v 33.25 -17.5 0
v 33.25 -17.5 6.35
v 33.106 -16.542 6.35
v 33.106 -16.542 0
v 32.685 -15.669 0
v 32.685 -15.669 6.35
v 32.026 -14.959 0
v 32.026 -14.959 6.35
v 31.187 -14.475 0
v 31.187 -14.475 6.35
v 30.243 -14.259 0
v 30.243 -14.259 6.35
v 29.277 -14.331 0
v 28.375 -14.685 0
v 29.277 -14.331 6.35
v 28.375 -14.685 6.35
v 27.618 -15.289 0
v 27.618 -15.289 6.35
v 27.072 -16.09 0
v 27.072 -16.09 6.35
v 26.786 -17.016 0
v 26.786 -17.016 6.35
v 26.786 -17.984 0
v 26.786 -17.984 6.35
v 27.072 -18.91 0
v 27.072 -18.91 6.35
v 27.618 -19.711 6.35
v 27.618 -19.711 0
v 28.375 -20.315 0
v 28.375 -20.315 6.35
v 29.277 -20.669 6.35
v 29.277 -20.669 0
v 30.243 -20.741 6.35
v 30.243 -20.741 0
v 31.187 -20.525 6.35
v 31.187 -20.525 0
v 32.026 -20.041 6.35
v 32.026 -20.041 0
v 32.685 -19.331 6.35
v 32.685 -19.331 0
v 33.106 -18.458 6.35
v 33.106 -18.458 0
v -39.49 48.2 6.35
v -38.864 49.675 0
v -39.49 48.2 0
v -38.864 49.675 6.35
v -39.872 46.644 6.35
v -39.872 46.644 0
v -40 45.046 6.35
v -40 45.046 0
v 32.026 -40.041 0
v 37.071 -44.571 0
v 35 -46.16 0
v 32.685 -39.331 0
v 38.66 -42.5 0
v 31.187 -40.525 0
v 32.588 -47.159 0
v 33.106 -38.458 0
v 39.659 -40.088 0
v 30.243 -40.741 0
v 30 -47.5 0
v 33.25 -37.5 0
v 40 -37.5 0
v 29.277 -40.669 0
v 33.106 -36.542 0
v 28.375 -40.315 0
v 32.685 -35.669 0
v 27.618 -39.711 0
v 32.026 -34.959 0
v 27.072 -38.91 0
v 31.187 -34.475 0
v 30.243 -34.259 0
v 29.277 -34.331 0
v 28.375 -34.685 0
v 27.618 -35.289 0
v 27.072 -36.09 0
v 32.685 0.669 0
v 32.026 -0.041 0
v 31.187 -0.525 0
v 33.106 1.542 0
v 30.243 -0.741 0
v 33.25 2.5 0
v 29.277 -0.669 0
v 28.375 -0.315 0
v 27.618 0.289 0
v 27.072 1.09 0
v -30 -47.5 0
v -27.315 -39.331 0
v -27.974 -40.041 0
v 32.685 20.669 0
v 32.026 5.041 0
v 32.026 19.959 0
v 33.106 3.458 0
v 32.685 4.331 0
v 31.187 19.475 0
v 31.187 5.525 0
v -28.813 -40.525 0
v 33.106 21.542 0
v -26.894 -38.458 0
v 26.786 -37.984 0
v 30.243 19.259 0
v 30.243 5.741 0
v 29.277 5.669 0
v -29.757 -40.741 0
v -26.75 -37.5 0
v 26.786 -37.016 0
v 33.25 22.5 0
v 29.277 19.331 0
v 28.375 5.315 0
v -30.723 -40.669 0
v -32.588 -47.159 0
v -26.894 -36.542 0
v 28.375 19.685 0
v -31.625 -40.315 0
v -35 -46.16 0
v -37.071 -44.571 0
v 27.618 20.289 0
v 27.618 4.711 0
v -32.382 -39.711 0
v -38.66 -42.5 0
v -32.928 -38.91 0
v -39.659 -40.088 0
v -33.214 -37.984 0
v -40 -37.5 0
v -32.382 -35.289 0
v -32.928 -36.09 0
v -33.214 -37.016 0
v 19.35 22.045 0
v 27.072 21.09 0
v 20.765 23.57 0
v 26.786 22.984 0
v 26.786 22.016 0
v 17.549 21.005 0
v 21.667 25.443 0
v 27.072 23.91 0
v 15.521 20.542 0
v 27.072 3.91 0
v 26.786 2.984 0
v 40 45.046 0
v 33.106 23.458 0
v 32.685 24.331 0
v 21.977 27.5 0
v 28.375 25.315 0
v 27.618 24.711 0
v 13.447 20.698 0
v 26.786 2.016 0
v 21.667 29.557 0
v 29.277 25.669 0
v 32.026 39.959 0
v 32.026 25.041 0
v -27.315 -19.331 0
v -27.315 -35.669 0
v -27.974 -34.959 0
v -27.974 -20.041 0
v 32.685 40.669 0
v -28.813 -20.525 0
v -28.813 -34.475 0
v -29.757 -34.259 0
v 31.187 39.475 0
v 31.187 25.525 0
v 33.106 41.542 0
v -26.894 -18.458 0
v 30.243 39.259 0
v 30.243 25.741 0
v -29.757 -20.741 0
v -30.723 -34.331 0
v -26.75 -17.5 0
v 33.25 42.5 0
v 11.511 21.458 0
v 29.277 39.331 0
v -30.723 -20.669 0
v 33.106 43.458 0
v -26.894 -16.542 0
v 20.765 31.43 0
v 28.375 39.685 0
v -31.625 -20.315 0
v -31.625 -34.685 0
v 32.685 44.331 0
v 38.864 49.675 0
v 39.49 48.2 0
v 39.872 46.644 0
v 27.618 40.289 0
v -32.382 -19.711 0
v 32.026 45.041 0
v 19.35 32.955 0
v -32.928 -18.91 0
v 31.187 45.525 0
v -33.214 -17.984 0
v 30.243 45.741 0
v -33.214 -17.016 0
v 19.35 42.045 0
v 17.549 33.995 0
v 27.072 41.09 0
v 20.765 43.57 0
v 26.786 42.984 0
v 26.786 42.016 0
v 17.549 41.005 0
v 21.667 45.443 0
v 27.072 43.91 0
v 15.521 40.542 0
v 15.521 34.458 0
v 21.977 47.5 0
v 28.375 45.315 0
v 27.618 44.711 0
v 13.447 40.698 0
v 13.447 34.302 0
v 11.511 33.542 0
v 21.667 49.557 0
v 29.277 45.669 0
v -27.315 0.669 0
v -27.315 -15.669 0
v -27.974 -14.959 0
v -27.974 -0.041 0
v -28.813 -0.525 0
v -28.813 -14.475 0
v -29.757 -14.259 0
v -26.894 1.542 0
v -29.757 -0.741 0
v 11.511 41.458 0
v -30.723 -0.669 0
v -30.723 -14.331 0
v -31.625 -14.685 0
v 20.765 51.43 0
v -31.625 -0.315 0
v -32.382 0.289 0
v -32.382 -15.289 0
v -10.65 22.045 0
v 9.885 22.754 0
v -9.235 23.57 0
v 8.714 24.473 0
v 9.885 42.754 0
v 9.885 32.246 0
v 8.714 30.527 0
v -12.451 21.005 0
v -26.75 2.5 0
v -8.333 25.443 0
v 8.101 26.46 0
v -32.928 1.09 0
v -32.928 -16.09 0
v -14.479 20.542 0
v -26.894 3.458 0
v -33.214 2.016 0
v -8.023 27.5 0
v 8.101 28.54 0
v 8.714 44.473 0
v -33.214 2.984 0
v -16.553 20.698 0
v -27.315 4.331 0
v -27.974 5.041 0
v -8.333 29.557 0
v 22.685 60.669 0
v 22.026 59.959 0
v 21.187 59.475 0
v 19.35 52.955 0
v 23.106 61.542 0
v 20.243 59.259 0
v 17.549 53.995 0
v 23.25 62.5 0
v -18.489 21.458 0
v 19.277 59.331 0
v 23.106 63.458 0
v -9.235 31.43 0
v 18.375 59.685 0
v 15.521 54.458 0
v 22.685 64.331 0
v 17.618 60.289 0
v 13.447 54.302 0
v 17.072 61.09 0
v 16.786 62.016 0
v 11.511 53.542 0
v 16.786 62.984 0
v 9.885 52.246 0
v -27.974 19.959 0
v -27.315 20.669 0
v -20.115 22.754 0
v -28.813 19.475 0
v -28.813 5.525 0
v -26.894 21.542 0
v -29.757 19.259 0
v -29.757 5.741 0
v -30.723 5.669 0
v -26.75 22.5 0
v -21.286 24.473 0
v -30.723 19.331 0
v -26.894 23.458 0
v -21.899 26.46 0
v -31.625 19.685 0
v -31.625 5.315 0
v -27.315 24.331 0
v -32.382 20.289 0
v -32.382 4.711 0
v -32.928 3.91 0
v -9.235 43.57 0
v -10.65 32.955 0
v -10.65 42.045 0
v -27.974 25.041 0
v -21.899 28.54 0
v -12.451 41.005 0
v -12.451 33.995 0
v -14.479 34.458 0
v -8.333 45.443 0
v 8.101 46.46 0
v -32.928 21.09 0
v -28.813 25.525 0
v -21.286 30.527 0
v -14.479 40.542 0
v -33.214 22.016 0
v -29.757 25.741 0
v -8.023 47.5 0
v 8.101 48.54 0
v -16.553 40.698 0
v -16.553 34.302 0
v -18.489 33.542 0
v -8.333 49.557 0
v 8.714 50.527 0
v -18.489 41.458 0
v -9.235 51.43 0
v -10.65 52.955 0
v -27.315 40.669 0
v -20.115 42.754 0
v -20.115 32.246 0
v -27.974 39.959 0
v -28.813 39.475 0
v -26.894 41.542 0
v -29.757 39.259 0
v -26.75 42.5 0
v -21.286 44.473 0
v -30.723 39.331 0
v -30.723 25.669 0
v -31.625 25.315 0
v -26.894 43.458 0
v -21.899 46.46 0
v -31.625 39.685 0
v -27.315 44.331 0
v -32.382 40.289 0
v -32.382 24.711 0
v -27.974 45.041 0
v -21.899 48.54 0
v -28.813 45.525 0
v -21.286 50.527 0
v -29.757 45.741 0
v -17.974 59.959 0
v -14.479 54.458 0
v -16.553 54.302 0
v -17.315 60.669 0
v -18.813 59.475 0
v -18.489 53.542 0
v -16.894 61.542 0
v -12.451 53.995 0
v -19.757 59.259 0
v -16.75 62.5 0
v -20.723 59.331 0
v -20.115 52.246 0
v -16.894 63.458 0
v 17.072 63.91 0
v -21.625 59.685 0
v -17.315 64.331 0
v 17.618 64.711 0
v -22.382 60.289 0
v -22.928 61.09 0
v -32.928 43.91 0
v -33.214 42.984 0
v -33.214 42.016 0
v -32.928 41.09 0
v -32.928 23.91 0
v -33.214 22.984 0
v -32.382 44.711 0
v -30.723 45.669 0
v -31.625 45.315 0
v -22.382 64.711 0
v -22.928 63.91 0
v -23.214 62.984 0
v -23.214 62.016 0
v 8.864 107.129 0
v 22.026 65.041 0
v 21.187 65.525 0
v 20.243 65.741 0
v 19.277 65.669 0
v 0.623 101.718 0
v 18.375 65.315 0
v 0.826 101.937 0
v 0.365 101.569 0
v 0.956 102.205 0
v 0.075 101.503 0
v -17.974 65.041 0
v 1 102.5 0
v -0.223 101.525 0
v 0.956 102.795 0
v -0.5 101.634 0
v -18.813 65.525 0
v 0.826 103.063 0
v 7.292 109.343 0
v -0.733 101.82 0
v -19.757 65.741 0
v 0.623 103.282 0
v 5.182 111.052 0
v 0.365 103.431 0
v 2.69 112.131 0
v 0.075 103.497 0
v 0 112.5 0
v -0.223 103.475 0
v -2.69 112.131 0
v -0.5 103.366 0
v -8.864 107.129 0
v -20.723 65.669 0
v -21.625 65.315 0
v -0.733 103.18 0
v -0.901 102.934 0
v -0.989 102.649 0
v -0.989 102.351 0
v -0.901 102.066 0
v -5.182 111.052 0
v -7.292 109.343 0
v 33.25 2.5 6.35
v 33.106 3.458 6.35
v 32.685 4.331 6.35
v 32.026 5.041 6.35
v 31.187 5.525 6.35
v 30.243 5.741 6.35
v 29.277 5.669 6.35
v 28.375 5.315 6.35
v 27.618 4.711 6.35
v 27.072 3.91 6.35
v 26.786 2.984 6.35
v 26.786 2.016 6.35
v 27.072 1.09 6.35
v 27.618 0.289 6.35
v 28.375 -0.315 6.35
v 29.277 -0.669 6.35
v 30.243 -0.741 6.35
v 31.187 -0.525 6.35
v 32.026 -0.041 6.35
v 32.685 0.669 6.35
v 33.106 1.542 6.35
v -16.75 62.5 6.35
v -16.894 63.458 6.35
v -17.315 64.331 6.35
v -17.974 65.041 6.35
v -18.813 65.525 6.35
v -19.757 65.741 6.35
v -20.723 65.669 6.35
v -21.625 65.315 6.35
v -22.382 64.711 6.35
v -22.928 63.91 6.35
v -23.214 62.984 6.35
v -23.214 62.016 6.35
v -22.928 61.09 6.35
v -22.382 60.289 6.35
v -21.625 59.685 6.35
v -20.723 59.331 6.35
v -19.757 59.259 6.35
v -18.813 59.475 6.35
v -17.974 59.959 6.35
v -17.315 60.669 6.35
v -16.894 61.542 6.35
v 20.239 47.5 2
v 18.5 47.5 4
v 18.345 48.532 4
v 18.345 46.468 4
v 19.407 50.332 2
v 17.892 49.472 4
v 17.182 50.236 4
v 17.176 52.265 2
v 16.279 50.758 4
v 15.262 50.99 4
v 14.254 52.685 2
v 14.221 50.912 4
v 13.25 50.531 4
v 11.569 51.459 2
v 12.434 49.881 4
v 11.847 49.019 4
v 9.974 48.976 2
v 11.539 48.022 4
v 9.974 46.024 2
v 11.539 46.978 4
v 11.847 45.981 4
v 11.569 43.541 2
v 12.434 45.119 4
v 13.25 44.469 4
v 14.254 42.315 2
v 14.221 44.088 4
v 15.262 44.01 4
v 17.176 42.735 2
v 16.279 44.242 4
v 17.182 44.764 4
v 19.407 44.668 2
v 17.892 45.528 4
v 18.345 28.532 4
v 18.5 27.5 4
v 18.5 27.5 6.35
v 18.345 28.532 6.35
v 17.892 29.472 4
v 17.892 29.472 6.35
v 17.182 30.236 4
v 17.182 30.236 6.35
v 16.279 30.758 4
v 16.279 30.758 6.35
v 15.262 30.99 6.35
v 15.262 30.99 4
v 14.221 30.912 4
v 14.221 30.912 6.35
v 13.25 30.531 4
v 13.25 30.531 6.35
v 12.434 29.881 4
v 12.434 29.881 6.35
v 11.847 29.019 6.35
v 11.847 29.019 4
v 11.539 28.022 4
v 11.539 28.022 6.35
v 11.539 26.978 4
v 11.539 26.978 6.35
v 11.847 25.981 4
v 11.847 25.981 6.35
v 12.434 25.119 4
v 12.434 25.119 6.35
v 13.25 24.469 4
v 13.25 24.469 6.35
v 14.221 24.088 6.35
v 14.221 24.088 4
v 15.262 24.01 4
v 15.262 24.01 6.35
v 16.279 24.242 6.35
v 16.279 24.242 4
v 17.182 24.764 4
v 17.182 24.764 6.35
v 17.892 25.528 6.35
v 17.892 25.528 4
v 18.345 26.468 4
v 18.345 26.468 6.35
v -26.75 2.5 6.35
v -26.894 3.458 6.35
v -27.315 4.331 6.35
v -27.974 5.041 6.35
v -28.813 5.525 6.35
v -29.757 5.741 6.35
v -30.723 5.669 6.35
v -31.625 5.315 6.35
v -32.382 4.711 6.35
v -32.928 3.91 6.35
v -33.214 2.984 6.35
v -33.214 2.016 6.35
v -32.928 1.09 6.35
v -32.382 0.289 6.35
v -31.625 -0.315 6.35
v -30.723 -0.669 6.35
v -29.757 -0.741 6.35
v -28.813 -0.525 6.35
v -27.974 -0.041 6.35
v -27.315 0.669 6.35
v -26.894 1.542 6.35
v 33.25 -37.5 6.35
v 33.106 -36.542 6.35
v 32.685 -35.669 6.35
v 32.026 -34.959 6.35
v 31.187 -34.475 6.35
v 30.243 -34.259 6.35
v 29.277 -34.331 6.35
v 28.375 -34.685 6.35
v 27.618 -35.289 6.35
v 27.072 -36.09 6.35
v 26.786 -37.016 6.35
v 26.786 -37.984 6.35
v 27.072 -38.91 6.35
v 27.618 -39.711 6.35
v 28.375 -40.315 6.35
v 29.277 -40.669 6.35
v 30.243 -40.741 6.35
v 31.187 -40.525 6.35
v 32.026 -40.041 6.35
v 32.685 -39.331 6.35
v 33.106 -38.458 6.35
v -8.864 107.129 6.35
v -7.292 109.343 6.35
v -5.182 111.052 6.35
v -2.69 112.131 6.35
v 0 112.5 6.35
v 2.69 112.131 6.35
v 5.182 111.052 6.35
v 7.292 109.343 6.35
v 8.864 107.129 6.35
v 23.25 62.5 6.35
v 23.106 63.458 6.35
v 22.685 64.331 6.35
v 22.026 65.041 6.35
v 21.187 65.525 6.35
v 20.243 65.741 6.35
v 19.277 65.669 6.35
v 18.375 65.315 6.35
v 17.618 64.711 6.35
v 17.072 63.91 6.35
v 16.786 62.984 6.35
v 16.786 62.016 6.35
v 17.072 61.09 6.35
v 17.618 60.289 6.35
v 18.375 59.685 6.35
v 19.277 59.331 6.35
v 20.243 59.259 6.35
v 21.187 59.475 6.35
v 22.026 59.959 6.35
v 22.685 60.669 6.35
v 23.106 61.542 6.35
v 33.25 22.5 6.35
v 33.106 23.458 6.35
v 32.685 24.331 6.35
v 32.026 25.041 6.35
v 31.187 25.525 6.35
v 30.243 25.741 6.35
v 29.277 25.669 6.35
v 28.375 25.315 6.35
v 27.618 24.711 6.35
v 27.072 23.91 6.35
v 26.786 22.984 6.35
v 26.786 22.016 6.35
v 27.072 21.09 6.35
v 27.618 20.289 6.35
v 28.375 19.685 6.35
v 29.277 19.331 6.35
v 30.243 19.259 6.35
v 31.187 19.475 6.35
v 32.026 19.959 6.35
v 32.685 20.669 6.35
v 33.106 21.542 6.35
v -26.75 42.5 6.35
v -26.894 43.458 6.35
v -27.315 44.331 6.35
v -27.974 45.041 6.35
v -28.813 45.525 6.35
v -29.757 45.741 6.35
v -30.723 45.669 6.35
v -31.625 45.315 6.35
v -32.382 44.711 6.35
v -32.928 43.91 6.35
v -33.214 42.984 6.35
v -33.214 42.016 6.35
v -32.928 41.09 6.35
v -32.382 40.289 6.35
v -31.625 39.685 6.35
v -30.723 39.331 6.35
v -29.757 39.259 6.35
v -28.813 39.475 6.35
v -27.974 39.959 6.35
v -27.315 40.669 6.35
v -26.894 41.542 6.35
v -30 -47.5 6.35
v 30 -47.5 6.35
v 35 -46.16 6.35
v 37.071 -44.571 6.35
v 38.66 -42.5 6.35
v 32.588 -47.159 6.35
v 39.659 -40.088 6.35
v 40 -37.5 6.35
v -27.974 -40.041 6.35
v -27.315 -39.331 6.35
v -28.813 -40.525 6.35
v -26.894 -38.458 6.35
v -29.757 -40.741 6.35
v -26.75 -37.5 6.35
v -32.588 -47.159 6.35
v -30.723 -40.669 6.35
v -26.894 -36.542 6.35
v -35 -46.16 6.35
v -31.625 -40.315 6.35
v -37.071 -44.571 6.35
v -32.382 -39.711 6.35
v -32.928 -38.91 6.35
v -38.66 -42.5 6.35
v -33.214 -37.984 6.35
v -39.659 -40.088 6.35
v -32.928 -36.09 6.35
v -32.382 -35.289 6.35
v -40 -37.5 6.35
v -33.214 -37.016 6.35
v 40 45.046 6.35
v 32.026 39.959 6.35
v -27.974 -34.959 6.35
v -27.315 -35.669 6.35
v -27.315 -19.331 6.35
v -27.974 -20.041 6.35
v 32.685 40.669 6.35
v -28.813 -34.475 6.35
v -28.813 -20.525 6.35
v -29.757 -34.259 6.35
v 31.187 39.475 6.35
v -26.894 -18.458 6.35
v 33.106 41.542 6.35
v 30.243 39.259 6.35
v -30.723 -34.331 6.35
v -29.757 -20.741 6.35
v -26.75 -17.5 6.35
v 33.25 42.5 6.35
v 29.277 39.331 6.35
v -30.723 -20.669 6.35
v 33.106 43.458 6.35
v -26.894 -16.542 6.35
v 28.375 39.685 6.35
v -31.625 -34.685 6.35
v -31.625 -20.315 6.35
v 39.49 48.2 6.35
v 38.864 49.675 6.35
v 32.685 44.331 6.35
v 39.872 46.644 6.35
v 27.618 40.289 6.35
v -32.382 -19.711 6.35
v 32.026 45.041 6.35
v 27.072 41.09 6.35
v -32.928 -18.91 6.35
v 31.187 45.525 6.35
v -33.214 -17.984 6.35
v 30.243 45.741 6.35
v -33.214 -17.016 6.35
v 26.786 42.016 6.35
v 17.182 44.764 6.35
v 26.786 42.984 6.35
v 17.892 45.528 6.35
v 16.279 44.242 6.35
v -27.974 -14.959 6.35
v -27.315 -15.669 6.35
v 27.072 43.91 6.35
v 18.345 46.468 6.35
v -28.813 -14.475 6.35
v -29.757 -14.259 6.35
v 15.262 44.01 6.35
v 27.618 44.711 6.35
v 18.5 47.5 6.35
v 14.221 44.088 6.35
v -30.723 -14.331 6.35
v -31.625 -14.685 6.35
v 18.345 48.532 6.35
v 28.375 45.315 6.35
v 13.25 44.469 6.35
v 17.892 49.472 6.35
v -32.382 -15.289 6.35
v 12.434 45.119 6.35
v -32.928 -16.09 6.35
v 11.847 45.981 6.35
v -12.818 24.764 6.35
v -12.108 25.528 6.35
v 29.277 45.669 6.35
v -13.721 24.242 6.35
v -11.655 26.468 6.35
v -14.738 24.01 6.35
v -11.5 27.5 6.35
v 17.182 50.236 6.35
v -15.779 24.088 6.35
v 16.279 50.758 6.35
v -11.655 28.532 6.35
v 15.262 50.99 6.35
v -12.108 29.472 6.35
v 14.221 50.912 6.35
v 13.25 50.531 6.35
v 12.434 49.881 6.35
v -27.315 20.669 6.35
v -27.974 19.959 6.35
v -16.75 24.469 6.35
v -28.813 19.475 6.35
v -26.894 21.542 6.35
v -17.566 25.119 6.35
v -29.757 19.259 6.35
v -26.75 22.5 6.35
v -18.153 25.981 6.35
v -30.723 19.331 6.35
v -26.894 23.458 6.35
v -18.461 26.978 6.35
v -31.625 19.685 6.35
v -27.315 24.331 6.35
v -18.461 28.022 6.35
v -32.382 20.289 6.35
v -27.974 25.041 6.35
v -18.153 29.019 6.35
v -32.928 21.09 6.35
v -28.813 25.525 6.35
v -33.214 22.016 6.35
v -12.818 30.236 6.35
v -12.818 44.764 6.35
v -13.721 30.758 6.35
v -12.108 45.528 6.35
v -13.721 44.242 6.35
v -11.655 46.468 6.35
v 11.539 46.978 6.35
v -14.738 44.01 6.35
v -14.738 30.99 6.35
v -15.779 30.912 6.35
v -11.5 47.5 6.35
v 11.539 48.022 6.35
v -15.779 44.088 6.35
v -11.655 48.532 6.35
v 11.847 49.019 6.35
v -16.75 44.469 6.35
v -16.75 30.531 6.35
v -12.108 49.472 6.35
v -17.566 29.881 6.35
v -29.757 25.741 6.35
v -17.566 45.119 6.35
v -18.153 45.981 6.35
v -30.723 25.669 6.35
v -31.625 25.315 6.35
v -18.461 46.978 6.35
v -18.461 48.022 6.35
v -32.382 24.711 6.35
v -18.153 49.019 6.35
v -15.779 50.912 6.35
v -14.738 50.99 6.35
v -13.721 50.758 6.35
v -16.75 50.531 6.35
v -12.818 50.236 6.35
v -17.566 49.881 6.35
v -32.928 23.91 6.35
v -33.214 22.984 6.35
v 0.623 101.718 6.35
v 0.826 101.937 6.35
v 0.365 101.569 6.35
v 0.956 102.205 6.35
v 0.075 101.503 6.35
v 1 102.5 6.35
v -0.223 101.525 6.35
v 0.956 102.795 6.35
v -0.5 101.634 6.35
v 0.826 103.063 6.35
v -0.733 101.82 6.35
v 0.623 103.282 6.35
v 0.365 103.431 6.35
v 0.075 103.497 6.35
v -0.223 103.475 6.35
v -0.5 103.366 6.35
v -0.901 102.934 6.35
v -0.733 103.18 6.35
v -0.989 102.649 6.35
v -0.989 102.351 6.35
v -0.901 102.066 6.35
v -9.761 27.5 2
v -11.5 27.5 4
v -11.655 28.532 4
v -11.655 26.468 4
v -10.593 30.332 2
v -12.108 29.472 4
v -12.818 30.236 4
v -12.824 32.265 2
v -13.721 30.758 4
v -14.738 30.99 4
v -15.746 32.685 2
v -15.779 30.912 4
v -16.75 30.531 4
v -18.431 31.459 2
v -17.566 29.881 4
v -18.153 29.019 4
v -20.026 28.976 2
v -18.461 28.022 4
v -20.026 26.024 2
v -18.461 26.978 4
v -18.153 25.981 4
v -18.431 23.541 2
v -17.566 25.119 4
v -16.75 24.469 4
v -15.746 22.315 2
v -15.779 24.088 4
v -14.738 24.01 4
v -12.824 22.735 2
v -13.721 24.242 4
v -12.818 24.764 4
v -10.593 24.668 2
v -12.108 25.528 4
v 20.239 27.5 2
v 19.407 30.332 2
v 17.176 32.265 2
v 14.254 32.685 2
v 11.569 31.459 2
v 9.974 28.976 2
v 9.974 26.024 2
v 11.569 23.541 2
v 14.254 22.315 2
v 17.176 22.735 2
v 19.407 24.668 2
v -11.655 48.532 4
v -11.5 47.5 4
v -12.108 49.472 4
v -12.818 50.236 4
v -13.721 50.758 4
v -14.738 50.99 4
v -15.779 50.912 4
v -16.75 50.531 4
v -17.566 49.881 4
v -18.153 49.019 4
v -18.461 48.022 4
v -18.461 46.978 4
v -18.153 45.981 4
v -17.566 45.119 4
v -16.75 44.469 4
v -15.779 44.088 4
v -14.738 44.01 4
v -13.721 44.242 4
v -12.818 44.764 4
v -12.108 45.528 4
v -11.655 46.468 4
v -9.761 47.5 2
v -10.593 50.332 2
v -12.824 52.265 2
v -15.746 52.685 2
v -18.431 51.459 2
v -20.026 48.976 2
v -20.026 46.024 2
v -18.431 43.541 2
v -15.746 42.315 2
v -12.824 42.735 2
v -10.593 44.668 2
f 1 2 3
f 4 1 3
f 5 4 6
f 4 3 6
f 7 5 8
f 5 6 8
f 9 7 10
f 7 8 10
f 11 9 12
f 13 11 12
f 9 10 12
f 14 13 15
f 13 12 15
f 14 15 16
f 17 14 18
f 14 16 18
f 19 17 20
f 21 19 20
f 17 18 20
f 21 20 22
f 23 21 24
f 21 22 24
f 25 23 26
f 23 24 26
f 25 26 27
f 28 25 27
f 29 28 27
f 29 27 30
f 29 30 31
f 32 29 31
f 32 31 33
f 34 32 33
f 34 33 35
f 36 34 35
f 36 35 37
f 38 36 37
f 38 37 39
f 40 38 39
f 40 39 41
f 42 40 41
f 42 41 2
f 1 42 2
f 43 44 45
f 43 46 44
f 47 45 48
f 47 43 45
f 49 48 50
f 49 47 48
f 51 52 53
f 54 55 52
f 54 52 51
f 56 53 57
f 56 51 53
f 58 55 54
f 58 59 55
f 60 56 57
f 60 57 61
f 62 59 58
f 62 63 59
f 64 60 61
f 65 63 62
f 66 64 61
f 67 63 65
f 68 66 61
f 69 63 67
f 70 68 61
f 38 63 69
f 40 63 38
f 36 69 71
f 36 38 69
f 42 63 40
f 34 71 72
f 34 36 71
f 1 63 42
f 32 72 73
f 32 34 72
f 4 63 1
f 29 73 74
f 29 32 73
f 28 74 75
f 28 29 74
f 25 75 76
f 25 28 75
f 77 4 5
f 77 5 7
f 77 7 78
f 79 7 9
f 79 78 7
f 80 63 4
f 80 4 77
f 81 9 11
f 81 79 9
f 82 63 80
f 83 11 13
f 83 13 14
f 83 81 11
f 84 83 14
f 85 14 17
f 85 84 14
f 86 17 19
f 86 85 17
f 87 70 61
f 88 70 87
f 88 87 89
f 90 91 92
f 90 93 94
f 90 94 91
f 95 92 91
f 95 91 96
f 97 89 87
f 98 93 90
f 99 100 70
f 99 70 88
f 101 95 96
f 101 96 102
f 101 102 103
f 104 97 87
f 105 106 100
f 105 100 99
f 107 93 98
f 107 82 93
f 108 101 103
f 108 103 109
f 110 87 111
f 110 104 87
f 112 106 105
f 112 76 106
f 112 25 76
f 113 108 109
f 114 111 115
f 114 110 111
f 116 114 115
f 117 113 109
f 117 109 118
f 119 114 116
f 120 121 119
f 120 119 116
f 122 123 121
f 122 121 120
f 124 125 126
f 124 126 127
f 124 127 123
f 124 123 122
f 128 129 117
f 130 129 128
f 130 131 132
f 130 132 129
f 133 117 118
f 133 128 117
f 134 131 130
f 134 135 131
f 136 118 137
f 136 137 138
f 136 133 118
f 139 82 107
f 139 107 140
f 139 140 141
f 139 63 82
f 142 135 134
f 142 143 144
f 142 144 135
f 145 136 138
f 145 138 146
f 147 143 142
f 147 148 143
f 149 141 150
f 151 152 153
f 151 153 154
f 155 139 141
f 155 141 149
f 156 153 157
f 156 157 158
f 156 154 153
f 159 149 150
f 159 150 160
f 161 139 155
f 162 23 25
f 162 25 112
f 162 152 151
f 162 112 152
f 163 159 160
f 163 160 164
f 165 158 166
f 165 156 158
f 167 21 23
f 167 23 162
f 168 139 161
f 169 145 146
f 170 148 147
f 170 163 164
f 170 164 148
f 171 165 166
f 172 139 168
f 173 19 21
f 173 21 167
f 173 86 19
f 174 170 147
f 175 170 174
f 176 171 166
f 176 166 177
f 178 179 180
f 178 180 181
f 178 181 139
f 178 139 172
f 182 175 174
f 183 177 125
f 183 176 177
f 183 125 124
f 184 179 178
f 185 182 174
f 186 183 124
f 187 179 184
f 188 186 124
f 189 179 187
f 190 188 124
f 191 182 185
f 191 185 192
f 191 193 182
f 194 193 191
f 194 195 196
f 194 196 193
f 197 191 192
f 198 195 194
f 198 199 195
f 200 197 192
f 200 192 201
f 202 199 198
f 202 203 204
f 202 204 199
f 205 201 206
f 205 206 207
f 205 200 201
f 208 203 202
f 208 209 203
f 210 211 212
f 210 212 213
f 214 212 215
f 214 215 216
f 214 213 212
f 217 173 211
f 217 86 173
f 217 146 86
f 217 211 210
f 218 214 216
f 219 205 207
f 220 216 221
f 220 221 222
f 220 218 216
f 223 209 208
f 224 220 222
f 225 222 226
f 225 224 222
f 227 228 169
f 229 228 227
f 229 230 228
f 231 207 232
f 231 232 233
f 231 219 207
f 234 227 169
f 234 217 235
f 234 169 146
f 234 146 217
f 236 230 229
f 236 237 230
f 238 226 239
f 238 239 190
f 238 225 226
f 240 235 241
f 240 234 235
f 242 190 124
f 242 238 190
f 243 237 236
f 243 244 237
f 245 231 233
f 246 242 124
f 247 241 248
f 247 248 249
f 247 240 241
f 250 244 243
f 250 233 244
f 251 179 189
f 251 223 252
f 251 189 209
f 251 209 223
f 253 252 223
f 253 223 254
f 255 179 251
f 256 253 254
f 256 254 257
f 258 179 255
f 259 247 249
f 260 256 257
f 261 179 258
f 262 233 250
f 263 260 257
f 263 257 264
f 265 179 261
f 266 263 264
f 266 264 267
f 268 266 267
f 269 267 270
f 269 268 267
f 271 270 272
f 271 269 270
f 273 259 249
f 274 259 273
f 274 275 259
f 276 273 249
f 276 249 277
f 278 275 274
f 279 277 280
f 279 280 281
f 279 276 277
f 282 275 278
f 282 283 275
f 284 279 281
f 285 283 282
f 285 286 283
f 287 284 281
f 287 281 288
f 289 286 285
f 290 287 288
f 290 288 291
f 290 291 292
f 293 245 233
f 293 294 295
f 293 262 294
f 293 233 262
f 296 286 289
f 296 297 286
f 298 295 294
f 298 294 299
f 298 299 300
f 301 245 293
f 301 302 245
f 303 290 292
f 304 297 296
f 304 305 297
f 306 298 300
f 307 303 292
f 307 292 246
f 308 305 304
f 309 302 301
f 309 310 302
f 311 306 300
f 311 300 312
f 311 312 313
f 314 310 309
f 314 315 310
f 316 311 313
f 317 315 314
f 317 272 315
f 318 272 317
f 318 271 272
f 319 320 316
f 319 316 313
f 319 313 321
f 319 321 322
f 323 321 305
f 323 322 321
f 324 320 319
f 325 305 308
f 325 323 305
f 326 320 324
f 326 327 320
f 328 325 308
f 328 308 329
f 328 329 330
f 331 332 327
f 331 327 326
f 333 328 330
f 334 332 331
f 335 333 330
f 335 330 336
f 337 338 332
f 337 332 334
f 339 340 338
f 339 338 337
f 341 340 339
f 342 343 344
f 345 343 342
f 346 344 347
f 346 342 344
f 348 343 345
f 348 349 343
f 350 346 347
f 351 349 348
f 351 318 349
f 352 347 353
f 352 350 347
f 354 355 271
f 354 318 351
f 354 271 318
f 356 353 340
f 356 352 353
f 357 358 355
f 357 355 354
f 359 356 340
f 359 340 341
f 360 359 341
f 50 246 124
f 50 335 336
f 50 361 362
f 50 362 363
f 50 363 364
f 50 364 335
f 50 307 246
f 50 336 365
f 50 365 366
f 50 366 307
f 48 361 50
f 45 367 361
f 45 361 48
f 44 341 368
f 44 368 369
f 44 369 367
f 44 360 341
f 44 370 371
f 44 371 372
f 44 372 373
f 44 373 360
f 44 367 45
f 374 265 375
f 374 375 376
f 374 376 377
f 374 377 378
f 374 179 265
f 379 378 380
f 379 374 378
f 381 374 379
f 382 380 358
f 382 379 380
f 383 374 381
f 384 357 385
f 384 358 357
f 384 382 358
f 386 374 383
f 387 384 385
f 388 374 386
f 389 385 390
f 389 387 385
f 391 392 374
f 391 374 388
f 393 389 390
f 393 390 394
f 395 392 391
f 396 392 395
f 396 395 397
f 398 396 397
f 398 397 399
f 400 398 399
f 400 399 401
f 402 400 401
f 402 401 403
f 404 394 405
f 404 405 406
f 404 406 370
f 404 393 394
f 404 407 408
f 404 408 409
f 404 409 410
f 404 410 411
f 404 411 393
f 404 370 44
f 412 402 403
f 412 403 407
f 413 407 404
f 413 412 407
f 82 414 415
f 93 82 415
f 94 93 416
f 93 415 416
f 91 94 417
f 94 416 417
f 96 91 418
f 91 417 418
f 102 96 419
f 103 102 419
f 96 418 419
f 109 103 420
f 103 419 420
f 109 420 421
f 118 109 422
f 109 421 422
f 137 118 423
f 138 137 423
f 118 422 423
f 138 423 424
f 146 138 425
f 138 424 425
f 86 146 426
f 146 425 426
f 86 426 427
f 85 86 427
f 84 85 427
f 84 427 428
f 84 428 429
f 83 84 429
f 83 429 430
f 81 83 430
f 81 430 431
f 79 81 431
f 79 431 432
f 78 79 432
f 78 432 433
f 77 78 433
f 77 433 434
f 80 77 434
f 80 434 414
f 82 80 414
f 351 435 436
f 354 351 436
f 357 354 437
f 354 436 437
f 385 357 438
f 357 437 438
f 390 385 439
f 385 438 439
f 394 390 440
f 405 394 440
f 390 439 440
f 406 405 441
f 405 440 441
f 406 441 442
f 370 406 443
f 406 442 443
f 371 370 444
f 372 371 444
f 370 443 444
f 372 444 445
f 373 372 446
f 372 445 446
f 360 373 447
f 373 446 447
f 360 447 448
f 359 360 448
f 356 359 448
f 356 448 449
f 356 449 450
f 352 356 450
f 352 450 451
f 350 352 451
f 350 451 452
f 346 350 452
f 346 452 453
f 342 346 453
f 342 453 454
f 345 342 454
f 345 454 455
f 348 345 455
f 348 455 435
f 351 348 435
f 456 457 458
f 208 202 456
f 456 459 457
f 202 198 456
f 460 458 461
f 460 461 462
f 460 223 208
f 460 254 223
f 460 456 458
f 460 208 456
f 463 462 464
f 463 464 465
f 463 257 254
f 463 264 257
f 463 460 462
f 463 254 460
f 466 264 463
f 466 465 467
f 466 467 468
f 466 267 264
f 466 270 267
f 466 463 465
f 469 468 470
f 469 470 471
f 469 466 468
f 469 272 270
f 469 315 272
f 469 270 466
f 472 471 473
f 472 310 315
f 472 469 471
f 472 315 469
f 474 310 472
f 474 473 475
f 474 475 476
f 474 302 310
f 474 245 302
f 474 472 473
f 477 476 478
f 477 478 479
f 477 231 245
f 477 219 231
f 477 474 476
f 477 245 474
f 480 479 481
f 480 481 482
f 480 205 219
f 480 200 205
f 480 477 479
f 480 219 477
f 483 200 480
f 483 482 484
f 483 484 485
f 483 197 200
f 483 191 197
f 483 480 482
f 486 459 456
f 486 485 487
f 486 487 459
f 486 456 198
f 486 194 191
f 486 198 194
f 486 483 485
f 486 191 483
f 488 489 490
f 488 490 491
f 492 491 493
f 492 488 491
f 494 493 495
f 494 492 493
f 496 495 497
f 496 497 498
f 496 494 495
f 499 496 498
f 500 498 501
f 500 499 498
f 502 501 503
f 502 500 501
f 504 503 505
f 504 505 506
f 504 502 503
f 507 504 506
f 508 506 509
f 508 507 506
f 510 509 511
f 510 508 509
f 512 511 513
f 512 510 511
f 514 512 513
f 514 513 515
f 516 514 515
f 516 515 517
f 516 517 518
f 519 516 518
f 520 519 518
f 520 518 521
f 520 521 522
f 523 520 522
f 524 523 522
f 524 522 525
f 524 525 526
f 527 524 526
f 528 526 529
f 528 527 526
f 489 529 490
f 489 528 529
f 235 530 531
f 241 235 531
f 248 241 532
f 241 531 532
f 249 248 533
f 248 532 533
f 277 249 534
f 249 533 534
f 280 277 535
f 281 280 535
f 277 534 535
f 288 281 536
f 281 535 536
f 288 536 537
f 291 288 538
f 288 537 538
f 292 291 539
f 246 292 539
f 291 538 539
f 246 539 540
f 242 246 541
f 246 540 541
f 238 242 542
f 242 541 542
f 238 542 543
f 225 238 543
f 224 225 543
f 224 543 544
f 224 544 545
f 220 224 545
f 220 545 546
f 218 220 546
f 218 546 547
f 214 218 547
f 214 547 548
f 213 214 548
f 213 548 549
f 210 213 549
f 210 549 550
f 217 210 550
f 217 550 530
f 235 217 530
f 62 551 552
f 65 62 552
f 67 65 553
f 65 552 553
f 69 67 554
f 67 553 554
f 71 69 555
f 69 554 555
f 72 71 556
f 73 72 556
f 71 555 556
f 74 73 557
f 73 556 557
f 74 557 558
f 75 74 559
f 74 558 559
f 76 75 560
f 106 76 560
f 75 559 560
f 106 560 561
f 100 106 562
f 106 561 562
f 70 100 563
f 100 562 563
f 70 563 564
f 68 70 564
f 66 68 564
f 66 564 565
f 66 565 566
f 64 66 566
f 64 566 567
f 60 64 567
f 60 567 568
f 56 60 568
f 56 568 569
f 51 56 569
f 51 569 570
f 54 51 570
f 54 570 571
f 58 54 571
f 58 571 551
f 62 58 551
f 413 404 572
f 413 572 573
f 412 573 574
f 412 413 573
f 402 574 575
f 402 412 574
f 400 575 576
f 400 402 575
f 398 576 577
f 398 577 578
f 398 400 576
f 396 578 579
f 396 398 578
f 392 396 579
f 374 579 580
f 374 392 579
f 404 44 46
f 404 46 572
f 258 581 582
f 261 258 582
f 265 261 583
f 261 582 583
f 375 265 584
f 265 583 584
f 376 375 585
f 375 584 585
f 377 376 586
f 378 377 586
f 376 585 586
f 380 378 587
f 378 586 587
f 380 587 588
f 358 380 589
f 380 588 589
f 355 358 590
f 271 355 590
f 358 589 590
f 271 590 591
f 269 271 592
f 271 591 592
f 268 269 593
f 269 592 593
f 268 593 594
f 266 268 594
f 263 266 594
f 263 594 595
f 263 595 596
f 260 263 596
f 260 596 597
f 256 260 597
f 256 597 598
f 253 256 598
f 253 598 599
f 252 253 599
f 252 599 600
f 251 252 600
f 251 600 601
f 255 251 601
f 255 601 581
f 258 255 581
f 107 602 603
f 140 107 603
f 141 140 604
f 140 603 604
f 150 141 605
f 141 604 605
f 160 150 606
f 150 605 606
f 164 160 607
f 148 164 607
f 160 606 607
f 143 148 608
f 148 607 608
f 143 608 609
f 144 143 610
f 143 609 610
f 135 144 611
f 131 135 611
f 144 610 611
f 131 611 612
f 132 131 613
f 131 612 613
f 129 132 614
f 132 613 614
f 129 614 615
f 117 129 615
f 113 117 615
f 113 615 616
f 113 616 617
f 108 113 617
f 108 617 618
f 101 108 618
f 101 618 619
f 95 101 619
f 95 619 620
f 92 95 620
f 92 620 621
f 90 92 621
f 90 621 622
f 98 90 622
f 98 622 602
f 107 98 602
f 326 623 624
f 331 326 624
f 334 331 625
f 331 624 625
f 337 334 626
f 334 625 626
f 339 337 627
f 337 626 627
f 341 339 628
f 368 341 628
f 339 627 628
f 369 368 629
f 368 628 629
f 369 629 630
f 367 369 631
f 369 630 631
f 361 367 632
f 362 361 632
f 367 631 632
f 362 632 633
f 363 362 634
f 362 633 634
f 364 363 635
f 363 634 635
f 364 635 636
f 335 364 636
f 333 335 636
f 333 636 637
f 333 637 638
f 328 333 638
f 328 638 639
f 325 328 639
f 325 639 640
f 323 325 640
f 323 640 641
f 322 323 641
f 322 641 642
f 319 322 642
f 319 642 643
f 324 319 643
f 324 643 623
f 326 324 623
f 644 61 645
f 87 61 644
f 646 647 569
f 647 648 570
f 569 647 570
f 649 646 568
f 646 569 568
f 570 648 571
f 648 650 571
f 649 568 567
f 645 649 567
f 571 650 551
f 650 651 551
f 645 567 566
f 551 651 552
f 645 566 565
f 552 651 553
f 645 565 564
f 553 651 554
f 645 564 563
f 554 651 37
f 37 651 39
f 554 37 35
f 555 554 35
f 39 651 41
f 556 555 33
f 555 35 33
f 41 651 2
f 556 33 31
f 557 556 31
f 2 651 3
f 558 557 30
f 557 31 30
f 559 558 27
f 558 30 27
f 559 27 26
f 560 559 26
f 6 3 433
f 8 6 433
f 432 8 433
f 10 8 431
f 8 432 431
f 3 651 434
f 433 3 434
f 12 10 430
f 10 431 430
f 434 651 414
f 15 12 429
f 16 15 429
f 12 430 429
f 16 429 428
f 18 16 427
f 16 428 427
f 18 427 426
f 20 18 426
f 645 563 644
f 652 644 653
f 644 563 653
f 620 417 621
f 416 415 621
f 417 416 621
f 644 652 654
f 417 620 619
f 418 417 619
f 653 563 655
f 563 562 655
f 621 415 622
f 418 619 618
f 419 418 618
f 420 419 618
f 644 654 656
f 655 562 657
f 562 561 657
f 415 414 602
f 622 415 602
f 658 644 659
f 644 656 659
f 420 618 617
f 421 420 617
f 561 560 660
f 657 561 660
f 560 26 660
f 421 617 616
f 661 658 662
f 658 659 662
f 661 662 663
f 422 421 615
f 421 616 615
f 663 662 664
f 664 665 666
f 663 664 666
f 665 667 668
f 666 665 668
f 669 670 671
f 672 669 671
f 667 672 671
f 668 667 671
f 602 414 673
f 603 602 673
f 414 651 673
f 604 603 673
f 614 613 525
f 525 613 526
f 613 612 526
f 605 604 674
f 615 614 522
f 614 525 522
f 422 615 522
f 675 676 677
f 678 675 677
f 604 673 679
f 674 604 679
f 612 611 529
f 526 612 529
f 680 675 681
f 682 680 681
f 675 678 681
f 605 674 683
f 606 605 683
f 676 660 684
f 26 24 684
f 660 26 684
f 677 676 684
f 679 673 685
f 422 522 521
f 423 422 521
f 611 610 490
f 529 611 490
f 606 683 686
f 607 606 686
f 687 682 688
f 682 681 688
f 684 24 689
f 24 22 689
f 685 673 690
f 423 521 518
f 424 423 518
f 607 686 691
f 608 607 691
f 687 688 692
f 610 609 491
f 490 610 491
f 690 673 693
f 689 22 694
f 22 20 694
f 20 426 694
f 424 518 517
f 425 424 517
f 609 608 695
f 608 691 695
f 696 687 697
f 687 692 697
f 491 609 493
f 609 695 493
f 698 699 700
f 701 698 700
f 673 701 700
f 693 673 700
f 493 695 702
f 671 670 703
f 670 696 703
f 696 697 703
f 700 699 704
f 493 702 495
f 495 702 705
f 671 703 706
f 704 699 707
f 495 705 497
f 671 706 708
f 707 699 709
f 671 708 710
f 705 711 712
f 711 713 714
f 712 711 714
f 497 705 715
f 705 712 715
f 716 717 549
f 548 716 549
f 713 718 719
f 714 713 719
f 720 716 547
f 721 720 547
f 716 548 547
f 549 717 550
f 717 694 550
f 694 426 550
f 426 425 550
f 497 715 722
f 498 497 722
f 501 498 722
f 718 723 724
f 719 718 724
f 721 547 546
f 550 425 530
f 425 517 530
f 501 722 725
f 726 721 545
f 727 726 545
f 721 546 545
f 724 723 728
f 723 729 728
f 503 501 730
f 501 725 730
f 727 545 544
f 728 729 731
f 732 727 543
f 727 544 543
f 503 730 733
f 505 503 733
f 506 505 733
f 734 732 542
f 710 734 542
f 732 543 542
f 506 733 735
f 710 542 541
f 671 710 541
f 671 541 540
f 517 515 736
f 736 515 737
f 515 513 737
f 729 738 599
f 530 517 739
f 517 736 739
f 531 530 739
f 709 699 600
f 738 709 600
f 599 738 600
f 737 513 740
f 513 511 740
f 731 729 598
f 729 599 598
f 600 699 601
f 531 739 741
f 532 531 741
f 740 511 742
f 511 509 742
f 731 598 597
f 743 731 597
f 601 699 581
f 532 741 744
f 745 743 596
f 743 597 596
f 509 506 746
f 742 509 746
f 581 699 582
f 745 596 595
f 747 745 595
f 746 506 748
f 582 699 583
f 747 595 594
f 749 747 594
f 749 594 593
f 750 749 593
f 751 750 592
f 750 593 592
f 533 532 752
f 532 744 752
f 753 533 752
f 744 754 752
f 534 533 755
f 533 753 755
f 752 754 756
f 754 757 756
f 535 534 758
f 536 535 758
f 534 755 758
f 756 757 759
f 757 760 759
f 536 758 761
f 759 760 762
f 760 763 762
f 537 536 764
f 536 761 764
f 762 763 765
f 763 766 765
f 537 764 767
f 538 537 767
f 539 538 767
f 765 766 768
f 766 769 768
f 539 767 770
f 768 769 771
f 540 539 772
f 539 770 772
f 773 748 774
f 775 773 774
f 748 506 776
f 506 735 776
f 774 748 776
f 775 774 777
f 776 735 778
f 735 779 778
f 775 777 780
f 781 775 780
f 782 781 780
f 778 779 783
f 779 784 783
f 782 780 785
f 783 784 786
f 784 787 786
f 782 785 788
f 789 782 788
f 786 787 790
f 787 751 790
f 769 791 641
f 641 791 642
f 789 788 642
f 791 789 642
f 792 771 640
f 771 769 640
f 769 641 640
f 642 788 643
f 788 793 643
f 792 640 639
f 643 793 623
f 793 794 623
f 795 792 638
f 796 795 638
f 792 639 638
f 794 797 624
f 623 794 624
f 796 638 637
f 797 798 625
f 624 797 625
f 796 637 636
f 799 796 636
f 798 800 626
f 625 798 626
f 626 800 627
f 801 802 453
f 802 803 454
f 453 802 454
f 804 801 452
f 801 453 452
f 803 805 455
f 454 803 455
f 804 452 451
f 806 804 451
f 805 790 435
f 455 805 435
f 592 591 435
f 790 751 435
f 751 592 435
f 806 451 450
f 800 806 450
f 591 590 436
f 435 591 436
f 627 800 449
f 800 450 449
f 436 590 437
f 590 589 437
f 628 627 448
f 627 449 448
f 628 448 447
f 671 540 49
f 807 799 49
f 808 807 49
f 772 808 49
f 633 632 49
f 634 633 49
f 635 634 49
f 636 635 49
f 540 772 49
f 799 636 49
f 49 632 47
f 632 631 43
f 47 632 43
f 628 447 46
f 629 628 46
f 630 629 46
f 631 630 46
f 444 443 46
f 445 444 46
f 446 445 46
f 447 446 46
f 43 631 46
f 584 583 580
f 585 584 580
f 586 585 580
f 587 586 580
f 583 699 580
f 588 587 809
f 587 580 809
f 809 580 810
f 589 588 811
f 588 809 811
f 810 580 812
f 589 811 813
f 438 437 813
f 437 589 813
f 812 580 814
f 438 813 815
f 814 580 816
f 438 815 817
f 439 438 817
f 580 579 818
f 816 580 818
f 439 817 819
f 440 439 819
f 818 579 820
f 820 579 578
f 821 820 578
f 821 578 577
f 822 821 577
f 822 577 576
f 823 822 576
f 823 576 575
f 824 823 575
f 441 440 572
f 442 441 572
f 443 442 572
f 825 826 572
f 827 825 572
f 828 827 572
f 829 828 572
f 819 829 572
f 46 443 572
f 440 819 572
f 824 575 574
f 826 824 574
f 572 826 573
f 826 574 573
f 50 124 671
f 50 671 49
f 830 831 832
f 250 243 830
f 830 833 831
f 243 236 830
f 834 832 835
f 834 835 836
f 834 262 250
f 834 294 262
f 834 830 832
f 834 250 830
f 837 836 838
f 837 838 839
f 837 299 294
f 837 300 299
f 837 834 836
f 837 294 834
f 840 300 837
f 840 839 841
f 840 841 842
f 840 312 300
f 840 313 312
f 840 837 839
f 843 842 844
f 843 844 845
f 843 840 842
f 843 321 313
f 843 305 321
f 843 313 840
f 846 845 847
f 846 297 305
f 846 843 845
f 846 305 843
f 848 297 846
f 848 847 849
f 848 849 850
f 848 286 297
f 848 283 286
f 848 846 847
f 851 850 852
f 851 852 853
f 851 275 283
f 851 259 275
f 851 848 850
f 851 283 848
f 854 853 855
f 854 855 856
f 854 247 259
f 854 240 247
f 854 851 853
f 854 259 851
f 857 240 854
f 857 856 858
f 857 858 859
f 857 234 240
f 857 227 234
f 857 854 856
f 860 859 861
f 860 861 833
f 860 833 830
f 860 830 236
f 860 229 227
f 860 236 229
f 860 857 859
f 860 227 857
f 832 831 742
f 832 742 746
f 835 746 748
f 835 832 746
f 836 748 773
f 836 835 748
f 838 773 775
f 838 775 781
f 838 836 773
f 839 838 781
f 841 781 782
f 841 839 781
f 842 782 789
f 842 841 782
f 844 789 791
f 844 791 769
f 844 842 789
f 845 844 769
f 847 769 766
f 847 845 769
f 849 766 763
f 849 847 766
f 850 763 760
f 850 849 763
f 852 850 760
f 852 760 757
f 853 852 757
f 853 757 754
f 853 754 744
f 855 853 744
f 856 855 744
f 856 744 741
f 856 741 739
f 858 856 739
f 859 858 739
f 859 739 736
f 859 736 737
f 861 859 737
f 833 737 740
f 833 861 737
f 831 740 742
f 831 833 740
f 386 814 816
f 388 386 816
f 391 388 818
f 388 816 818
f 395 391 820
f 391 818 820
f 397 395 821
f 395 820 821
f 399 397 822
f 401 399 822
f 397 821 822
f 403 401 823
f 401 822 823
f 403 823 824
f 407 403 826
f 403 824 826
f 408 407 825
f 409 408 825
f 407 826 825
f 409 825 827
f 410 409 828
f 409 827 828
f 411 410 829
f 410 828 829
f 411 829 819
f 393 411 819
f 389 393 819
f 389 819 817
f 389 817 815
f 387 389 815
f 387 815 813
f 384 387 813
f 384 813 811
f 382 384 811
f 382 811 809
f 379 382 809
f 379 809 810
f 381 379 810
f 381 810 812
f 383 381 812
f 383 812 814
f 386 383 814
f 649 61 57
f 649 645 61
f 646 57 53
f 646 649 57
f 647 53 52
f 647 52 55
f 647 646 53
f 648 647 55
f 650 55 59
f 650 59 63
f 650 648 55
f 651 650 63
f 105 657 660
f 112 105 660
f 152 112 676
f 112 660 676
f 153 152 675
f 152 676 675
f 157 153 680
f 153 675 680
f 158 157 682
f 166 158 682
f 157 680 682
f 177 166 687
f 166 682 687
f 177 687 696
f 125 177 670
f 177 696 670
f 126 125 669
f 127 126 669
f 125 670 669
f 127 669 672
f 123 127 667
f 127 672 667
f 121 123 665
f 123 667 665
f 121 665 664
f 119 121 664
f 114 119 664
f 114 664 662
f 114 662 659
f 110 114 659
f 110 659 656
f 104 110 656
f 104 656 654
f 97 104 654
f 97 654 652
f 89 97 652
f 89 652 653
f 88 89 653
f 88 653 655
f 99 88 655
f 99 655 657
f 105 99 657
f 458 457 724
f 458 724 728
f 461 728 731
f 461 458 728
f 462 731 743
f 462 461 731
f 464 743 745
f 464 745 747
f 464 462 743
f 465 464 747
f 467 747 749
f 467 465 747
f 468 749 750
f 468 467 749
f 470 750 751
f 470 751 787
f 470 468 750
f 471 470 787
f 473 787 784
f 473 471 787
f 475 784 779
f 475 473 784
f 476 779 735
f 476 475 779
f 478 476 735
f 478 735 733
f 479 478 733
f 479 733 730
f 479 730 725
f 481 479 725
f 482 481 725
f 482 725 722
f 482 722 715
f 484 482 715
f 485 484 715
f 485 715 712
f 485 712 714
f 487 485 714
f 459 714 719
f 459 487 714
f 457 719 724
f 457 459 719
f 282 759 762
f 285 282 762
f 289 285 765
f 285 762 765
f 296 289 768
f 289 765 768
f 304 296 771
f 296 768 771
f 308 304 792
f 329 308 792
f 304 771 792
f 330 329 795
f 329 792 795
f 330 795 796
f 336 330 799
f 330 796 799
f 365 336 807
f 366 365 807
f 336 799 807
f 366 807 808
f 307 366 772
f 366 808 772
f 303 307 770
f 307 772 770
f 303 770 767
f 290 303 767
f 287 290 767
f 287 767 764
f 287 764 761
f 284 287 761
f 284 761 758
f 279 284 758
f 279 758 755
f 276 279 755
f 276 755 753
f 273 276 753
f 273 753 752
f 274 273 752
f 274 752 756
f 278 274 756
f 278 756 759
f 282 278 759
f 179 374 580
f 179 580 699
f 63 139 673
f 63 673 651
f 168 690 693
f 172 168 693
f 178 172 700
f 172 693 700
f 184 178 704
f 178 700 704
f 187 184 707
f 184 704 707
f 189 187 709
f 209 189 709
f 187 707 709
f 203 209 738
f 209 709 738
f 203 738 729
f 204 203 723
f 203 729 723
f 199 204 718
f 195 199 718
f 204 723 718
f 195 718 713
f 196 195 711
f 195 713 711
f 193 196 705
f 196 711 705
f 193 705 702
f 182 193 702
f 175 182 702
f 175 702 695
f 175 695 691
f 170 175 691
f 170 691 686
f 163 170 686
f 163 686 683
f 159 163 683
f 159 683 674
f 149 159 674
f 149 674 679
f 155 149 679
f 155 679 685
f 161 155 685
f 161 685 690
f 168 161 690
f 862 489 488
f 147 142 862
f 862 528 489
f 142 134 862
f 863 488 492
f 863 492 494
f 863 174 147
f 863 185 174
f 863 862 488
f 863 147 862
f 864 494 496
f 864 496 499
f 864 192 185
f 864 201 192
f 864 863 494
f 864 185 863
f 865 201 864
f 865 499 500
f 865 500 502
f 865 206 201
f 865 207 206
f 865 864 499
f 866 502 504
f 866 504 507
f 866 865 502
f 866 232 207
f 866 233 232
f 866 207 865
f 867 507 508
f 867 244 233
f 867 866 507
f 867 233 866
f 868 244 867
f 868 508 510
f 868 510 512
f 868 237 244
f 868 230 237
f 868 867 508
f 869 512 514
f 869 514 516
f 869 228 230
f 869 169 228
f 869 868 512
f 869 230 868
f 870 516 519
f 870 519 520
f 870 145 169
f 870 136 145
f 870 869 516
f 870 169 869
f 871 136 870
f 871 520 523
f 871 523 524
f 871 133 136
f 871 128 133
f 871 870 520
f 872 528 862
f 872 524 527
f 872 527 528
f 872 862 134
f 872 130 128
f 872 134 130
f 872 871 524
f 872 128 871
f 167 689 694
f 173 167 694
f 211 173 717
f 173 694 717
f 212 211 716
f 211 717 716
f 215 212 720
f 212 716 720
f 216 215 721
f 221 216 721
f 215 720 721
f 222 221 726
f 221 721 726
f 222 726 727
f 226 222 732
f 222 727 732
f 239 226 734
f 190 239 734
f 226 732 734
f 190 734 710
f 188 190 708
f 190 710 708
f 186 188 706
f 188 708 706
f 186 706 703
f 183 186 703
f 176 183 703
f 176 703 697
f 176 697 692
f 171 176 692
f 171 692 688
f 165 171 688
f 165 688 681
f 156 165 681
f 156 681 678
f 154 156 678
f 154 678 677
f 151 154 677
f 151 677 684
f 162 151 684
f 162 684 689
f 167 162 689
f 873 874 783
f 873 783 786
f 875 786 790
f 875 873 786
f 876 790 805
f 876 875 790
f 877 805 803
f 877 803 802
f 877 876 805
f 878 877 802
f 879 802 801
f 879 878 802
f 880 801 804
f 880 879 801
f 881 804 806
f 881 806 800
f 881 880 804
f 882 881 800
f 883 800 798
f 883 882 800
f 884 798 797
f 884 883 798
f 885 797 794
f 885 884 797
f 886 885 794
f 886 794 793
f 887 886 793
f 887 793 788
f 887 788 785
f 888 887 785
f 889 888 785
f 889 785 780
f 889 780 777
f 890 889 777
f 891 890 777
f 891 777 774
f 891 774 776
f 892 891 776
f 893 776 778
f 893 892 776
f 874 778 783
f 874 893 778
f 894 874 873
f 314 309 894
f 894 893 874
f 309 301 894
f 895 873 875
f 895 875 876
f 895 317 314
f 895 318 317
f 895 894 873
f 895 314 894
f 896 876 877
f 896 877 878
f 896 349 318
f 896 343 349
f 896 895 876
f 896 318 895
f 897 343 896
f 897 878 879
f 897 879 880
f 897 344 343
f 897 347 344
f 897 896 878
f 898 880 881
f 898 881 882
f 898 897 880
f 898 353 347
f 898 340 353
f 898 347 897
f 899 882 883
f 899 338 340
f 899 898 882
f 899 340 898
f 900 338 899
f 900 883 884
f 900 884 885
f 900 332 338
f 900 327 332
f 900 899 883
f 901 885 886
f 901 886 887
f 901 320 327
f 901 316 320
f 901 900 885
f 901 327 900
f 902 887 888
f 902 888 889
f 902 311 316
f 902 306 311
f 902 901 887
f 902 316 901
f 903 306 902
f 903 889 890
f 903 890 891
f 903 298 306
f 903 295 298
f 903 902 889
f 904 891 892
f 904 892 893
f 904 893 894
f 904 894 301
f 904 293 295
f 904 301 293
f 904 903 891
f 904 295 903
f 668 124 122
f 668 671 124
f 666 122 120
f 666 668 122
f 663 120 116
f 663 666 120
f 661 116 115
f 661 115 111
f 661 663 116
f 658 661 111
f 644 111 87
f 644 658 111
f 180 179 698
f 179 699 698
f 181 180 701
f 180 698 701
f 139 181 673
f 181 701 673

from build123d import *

# Parameters (mm, degrees)
SKETCH1_R             = 3.5
BOSS_EXTRUDE1_DEPTH   = 6.35
SKETCH2_R             = 3.25
CUT_EXTRUDE1_DEPTH    = 7.35
LPATTERN1_COUNT       = 5
LPATTERN1_PITCH       = 20
FILLET1_R             = 10
SKETCH3_R             = 3.25
SKETCH3_R_2           = 1
CUT_EXTRUDE2_DEPTH    = 7.35
CHAMFER1_SIZE         = 4
CHAMFER1_SIZE2        = 3.477146951
CHAMFER1_PART_2_SIZE  = 4
CHAMFER1_PART_2_SIZE2 = 3.477146951
CHAMFER1_PART_3_SIZE  = 4
CHAMFER1_PART_3_SIZE2 = 3.477146951
CHAMFER1_PART_4_SIZE  = 4
CHAMFER1_PART_4_SIZE2 = 3.477146951


with BuildPart() as part:
    # Sketch1 → Boss-Extrude1 (new body)
    with BuildSketch(Plane.XY):
        with BuildLine():
            Line((-40, 47.5), (-8.864317001, 107.128594183))
            ThreePointArc((-8.864317001, 107.128594183), (0, 112.5), (8.864317001, 107.128594183))
            Line((8.864317001, 107.128594183), (40, 47.5))
            Line((40, 47.5), (40, -47.5))
            Line((40, -47.5), (-40, -47.5))
            Line((-40, -47.5), (-40, 47.5))
        make_face()
        with Locations((-15, 47.5)):
            Circle(SKETCH1_R, mode=Mode.SUBTRACT)
        with Locations((15, 47.5)):
            Circle(SKETCH1_R, mode=Mode.SUBTRACT)
        with Locations((-15, 27.5)):
            Circle(SKETCH1_R, mode=Mode.SUBTRACT)
        with Locations((15, 27.5)):
            Circle(SKETCH1_R, mode=Mode.SUBTRACT)
    extrude(amount=BOSS_EXTRUDE1_DEPTH)

    # Sketch2 → Cut-Extrude1 (cut, through all)
    with BuildSketch(Plane.XY.offset(6.35)):
        with Locations((30, -37.5)):
            Circle(SKETCH2_R)
        with Locations((-30, -37.5)):
            Circle(SKETCH2_R)
    cut_extrude1 = extrude(amount=-CUT_EXTRUDE1_DEPTH, mode=Mode.SUBTRACT)

    # LPattern1: Cut-Extrude1 ×5
    with Locations(*[(0, i * LPATTERN1_PITCH, 0) for i in range(1, LPATTERN1_COUNT)]):
        add(cut_extrude1, mode=Mode.SUBTRACT)

    # Fillet1
    fillet1_edges = [part.edges().sort_by_distance(p)[0] for p in [
        (40, 47.5, 3.175),
        (40, -47.5, 3.175),
        (-40, -47.5, 3.175),
        (-40, 47.5, 3.175),
    ]]
    fillet(fillet1_edges, radius=FILLET1_R)

    # Sketch3 → Cut-Extrude2 (cut, through all)
    with BuildSketch(Plane.XY.offset(6.35)):
        with Locations((-20, 62.5)):
            Circle(SKETCH3_R)
        with Locations((20, 62.5)):
            Circle(SKETCH3_R)
        with Locations((0, 102.5)):
            Circle(SKETCH3_R_2)
    extrude(amount=-CUT_EXTRUDE2_DEPTH, mode=Mode.SUBTRACT)

    # Chamfer1
    chamfer1_edges = [part.edges().sort_by_distance(p)[0] for p in [
        (-18.5, 47.5, 0),
    ]]
    chamfer1_side = [part.faces().sort_by_distance(p)[0] for p in [
        (-18.5, 47.5, 3.175),
    ]]
    chamfer(chamfer1_edges, length=CHAMFER1_SIZE, length2=CHAMFER1_SIZE2, reference=chamfer1_side[0])

    # Chamfer1 part 2
    chamfer1_part_2_edges = [part.edges().sort_by_distance(p)[0] for p in [
        (11.5, 47.5, 0),
    ]]
    chamfer1_part_2_side = [part.faces().sort_by_distance(p)[0] for p in [
        (11.5, 47.5, 3.175),
    ]]
    chamfer(chamfer1_part_2_edges, length=CHAMFER1_PART_2_SIZE, length2=CHAMFER1_PART_2_SIZE2, reference=chamfer1_part_2_side[0])

    # Chamfer1 part 3
    chamfer1_part_3_edges = [part.edges().sort_by_distance(p)[0] for p in [
        (-18.5, 27.5, 0),
    ]]
    chamfer1_part_3_side = [part.faces().sort_by_distance(p)[0] for p in [
        (-18.5, 27.5, 3.175),
    ]]
    chamfer(chamfer1_part_3_edges, length=CHAMFER1_PART_3_SIZE, length2=CHAMFER1_PART_3_SIZE2, reference=chamfer1_part_3_side[0])

    # Chamfer1 part 4
    chamfer1_part_4_edges = [part.edges().sort_by_distance(p)[0] for p in [
        (11.5, 27.5, 0),
    ]]
    chamfer1_part_4_side = [part.faces().sort_by_distance(p)[0] for p in [
        (11.5, 27.5, 3.175),
    ]]
    chamfer(chamfer1_part_4_edges, length=CHAMFER1_PART_4_SIZE, length2=CHAMFER1_PART_4_SIZE2, reference=chamfer1_part_4_side[0])


solid = part.part
